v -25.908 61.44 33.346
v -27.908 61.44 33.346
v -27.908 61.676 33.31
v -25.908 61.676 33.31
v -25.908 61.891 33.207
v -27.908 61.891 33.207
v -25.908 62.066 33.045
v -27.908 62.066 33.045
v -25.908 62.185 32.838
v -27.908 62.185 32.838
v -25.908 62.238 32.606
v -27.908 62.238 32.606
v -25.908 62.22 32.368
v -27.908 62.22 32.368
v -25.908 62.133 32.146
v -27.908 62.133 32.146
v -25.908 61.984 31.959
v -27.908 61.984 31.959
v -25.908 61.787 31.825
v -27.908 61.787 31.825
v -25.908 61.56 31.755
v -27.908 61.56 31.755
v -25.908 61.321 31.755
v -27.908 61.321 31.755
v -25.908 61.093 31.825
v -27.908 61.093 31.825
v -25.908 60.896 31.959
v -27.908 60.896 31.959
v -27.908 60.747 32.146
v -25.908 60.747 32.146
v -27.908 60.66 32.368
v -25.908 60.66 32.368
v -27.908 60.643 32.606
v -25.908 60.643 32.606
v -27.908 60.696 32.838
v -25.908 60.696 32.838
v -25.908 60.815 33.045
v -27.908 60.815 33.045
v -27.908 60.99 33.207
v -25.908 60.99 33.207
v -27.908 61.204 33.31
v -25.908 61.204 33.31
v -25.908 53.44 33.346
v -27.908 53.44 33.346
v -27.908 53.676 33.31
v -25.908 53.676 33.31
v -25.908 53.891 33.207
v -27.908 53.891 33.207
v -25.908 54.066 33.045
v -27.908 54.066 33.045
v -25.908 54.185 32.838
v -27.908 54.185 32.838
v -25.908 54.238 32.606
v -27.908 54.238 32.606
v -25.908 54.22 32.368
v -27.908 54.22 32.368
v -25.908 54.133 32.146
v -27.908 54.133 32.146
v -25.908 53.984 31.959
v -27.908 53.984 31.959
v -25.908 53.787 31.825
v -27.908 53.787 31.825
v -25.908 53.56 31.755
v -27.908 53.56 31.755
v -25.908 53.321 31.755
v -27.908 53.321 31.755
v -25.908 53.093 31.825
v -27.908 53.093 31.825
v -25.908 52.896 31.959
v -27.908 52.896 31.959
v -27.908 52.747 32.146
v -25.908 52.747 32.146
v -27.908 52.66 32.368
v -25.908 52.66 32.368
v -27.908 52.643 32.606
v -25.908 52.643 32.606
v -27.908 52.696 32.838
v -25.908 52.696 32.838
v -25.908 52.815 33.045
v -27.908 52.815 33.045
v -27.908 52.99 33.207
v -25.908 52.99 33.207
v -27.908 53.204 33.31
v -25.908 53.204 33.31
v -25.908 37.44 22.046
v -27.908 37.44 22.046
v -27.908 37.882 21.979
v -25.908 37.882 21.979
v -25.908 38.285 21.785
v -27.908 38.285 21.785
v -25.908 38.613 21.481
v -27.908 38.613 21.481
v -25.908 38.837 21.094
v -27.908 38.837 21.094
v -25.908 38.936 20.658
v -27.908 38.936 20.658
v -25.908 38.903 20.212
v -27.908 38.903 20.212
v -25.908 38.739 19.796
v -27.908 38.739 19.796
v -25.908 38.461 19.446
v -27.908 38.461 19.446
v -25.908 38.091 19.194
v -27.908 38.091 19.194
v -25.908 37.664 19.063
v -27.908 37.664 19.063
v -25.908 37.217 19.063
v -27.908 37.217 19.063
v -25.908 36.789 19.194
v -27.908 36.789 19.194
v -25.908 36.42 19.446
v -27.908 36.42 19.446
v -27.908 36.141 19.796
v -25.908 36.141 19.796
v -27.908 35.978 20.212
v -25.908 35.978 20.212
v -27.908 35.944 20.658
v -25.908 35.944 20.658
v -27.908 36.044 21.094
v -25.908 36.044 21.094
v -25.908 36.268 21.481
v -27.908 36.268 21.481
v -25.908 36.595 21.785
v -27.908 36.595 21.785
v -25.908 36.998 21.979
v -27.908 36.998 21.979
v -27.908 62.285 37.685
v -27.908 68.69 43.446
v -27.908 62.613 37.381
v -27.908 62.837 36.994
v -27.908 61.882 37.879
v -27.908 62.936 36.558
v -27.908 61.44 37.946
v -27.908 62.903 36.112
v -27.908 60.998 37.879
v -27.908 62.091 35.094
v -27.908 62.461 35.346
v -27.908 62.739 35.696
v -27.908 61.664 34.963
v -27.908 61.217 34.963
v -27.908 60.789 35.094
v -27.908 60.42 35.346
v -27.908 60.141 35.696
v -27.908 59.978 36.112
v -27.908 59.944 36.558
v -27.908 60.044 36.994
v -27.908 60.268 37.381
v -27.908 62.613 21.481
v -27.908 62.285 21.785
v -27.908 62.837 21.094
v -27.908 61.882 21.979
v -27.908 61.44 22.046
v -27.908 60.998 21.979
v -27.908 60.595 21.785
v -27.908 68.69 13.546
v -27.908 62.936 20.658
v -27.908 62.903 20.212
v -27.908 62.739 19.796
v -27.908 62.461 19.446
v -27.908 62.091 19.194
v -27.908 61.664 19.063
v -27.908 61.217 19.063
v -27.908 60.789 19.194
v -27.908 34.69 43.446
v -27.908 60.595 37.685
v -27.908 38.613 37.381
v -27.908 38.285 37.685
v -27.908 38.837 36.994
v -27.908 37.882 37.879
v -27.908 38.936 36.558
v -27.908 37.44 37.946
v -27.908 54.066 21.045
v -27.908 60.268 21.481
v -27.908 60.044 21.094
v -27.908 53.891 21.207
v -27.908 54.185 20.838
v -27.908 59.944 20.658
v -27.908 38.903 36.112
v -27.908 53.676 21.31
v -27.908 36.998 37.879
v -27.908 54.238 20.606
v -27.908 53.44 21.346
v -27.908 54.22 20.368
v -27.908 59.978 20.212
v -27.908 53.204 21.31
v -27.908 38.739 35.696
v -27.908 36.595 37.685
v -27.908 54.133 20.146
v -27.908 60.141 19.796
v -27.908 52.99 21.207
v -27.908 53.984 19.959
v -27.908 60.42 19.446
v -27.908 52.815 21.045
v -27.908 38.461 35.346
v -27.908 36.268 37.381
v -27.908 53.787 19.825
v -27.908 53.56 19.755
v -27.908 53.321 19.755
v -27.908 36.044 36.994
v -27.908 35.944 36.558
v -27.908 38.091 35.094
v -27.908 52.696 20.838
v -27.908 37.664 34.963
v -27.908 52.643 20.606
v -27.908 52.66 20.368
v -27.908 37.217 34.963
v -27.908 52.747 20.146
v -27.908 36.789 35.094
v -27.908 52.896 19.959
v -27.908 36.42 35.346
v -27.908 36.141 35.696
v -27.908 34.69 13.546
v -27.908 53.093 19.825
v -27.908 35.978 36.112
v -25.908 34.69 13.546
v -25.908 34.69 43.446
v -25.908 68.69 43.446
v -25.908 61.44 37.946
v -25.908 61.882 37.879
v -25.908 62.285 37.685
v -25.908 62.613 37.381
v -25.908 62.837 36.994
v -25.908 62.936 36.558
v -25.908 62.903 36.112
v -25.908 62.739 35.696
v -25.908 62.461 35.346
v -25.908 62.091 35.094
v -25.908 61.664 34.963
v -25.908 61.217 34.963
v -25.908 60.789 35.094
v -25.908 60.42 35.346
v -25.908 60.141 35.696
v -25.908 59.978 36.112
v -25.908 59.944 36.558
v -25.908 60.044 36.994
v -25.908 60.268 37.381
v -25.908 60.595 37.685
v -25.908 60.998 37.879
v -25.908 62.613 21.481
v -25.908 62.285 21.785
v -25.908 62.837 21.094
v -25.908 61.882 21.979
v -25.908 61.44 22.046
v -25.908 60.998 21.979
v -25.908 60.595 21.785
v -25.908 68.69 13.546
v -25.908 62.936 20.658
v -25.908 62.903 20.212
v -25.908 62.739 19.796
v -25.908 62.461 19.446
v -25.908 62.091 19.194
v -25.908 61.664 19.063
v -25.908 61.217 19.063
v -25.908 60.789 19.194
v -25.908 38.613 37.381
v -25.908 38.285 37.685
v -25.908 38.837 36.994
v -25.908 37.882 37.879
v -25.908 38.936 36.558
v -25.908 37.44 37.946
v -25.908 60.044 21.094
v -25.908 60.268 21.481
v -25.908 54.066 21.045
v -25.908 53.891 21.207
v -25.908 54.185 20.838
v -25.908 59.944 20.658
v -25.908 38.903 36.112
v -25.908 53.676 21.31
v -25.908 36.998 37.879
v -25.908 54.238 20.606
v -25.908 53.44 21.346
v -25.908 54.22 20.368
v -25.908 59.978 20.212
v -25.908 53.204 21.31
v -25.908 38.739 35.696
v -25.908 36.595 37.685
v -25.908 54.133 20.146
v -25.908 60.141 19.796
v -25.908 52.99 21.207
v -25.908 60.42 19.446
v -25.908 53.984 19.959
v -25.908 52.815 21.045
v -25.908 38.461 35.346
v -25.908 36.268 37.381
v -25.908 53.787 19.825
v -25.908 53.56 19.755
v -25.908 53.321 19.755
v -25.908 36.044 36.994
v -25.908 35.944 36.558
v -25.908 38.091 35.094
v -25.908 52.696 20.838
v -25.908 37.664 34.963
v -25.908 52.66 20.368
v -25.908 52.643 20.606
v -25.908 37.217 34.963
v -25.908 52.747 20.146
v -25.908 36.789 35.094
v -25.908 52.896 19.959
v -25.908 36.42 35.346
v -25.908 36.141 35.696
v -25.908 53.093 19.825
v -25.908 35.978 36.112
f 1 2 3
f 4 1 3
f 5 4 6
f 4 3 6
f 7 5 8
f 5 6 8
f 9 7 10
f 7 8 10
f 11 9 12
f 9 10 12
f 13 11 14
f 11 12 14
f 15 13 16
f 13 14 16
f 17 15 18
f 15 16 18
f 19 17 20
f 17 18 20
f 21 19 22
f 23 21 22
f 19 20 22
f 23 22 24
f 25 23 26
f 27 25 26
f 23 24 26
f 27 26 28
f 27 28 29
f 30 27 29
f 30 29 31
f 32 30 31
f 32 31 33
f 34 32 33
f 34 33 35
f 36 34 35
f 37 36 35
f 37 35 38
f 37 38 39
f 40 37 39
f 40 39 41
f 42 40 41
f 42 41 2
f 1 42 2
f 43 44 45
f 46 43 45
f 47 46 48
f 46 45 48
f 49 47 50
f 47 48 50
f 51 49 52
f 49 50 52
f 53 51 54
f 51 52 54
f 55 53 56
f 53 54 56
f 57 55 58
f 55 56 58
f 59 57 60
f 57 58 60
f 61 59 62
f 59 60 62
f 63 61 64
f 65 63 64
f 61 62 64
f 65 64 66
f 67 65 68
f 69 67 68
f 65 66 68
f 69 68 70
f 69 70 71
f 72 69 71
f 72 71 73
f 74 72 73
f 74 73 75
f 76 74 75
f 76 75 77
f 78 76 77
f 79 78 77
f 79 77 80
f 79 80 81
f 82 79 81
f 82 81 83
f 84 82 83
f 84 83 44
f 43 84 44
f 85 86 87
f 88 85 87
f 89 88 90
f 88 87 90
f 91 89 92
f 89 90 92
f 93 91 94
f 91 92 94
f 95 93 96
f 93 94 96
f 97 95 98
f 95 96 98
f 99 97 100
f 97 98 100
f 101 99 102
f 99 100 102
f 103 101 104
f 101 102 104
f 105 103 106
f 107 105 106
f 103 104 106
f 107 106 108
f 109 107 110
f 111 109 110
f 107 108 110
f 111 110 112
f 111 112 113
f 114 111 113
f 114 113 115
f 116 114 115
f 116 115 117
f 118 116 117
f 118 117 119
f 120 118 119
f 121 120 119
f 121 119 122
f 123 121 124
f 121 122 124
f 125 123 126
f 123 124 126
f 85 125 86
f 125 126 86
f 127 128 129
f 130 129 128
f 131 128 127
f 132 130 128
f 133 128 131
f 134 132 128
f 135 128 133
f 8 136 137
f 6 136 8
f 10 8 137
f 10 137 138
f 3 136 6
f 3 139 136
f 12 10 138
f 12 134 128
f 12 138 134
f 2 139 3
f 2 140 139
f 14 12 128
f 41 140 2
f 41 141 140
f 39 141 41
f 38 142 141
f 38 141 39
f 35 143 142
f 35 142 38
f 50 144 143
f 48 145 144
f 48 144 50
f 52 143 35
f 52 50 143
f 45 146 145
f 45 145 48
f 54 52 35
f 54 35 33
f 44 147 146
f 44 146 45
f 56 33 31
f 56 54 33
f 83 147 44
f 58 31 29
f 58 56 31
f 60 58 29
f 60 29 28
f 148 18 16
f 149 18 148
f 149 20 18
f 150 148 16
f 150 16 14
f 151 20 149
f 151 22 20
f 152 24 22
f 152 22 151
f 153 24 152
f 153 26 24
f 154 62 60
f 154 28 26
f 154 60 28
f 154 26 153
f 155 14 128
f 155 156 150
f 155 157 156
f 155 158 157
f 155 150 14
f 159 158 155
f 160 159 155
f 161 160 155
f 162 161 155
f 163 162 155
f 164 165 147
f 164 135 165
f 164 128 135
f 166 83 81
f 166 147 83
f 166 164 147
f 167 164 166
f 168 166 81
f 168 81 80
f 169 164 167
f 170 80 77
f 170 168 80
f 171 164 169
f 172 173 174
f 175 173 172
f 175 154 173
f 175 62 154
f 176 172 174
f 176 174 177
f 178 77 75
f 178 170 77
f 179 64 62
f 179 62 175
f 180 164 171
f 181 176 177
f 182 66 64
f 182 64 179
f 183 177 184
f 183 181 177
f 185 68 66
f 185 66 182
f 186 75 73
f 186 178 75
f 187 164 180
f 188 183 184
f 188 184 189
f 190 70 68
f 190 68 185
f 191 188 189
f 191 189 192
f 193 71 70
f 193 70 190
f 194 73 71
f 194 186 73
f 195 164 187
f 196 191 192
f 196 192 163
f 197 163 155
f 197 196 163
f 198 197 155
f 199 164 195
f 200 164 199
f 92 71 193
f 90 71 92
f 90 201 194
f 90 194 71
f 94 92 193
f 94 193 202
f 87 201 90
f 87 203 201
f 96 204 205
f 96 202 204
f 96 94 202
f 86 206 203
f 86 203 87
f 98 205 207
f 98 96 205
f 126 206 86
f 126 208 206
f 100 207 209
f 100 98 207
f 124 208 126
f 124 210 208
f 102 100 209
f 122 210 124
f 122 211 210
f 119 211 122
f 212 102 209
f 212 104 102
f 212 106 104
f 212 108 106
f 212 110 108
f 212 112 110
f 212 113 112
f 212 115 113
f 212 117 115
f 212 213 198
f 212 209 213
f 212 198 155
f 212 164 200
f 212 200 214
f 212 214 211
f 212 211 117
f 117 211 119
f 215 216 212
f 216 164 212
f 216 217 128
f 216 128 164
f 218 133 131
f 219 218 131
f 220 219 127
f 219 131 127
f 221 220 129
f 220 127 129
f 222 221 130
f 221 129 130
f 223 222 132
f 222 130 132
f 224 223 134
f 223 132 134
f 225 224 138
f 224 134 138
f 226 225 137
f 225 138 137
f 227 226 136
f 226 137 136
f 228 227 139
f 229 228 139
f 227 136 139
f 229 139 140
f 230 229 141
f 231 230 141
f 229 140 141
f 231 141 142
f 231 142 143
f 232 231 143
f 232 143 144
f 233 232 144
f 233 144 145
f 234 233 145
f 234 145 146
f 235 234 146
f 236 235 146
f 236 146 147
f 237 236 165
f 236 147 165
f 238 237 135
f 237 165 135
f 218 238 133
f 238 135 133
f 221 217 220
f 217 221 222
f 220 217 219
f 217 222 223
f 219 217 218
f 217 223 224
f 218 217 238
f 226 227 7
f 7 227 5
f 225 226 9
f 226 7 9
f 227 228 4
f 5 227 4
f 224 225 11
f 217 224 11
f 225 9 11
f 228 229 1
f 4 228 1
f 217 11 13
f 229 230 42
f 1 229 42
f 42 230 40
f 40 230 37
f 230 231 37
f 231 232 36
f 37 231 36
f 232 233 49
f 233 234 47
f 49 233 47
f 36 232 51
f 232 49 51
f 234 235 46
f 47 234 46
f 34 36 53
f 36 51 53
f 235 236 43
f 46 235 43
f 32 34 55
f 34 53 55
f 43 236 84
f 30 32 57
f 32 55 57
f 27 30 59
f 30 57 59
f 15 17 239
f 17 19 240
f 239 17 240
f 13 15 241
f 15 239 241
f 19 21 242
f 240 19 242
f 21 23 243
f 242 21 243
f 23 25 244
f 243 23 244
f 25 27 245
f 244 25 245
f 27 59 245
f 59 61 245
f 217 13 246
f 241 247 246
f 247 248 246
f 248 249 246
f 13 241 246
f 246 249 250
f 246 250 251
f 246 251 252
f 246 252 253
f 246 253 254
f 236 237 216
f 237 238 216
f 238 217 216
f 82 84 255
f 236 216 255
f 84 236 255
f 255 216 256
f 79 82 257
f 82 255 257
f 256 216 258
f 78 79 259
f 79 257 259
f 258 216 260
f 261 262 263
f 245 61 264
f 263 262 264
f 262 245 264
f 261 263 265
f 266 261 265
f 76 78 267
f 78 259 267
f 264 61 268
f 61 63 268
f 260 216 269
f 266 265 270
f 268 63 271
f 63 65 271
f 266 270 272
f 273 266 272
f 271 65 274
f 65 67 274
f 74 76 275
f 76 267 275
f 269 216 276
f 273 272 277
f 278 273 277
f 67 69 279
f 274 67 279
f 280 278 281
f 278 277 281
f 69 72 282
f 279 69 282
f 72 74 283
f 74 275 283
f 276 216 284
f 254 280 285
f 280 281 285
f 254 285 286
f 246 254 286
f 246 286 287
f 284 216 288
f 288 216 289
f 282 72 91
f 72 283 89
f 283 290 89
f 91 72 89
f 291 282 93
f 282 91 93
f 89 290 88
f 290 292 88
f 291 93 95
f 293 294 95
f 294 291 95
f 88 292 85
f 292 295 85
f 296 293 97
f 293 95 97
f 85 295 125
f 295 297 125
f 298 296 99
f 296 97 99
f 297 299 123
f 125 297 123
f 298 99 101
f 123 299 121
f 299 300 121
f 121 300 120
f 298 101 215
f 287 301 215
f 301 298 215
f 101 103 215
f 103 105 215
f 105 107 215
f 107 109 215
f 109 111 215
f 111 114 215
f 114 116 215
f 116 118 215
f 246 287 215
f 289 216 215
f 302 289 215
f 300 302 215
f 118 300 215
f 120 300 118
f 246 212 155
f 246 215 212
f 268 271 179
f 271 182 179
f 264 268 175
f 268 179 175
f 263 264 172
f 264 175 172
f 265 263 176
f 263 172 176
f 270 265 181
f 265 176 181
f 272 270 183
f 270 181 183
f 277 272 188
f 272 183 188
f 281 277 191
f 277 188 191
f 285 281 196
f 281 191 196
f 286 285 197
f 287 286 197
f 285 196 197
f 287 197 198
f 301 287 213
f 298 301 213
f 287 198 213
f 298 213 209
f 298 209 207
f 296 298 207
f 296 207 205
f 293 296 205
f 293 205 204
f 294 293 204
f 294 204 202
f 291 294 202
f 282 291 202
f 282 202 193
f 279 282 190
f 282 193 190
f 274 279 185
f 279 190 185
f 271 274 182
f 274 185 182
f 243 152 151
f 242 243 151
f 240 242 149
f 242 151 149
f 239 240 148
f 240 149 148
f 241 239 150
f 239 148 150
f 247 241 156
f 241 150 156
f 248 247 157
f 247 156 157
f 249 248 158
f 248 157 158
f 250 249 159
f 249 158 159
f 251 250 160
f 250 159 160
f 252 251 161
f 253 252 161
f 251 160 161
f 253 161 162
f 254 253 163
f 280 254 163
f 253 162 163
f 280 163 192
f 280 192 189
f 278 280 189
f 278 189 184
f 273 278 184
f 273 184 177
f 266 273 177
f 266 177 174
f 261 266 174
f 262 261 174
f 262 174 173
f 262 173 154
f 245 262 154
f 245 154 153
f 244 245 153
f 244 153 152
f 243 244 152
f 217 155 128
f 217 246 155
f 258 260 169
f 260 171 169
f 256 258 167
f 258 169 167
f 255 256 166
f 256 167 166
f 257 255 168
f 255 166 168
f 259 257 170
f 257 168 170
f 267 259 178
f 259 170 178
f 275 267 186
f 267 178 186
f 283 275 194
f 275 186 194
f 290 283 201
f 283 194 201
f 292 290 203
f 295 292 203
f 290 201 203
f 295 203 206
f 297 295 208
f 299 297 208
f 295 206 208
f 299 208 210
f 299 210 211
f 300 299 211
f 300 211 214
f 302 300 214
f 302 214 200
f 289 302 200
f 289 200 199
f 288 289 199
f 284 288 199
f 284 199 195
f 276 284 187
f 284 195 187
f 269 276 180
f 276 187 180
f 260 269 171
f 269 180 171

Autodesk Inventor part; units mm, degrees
ref_plane "YZ Plane" through (0, 0, 0) normal (1, 0, 0) x (0, 1, 0)
ref_plane "XZ Plane" through (0, 0, 0) normal (0, 1, 0) x (-1, 0, 0)
ref_plane "XY Plane" through (0, 0, 0) normal (0, 0, 1) x (1, 0, 0)
ref_plane "РабПлоскость1" through (-25.9085, 44.7403, 28.4958) normal (-1, 0, 0) x (0, 0, -1)
sketch "Эскиз1" plane through (-25.9085, 44.7403, 28.4958) normal (-1, 0, 0) x (0, 0, -1)
  line L0 (6, -10.75) -> (0, -10.75)
  line L1 (0, -10.75) -> (0, 48.15)
  line L2 (-14.95, -3.95) -> (14.95, -3.95)
  line L3 (14.95, -3.95) -> (14.95, -23.95)
  line L4 (14.95, -23.95) -> (-14.95, -23.95)
  line L5 (-14.95, -23.95) -> (-14.95, -3.95)
  line L6 (-14.95, -3.95) -> (14.95, -23.95) construction
  line L7 (14.95, -3.95) -> (-14.95, -23.95) construction
  point P0 (28.4958, 44.7403)
  point P1 (0, -13.95)
  dimension "d0" = 6
  dimension "d1" = 29.9
  dimension "d2" = 20
extrude "Выдавливание1" add sketch "Эскиз1" along normal blind 2
sketch "Эскиз2" plane through (-27.9085, 44.7403, 28.4958) normal (-1, 0, 0) x (0, 0, 1)
  line L0 (-14.95, 23.95) -> (-14.95, 3.95) projected
  line L1 (-14.95, 3.95) -> (14.95, 3.95)
  line L2 (14.95, 3.95) -> (14.95, -10.05)
  line L3 (14.95, -10.05) -> (-14.95, -10.05)
  line L4 (-14.95, -10.05) -> (-14.95, 3.95)
  point P0 (-28.4958, -44.7403)
  dimension "d5" = 14
extrude "Выдавливание2" add sketch "Эскиз2" against normal blind 2
sketch "Эскиз3" plane through (-27.9085, 44.7403, 28.4958) normal (-1, 0, 0) x (0, 0, 1)
  point P0 (-28.4958, -44.7403)
sketch "Эскиз4" plane through (-27.9085, 44.7403, 28.4958) normal (-1, 0, 0) x (0, 0, 1)
  circle A0 centre (-7.95, 16.7) radius 1.5 projected
  circle A1 centre (-7.95, -7.3) radius 1.5 projected
  circle A2 centre (7.95, -7.3) radius 1.5 projected
  circle A3 centre (7.95, 16.7) radius 1.5 projected
  point P0 (-28.4958, -44.7403)
extrude "Выдавливание3" cut sketch "Эскиз4" against normal blind 2
sketch "Эскиз5" plane through (-27.9085, 44.7403, 28.4958) normal (-1, 0, 0) x (0, 0, 1)
  circle A0 centre (4.05, 16.7) radius 0.8 projected
  circle A1 centre (4.05, 8.7) radius 0.8 projected
  circle A2 centre (-7.95, 8.7) radius 0.8 projected
  circle A3 centre (-7.95, 16.7) radius 0.8 projected
  point P0 (-28.4958, -44.7403)
extrude "Выдавливание4" cut sketch "Эскиз5" against normal blind 10 contours A0 | A1 | A2
properties part number "соединяет крепление с магнитом и рельсу"
